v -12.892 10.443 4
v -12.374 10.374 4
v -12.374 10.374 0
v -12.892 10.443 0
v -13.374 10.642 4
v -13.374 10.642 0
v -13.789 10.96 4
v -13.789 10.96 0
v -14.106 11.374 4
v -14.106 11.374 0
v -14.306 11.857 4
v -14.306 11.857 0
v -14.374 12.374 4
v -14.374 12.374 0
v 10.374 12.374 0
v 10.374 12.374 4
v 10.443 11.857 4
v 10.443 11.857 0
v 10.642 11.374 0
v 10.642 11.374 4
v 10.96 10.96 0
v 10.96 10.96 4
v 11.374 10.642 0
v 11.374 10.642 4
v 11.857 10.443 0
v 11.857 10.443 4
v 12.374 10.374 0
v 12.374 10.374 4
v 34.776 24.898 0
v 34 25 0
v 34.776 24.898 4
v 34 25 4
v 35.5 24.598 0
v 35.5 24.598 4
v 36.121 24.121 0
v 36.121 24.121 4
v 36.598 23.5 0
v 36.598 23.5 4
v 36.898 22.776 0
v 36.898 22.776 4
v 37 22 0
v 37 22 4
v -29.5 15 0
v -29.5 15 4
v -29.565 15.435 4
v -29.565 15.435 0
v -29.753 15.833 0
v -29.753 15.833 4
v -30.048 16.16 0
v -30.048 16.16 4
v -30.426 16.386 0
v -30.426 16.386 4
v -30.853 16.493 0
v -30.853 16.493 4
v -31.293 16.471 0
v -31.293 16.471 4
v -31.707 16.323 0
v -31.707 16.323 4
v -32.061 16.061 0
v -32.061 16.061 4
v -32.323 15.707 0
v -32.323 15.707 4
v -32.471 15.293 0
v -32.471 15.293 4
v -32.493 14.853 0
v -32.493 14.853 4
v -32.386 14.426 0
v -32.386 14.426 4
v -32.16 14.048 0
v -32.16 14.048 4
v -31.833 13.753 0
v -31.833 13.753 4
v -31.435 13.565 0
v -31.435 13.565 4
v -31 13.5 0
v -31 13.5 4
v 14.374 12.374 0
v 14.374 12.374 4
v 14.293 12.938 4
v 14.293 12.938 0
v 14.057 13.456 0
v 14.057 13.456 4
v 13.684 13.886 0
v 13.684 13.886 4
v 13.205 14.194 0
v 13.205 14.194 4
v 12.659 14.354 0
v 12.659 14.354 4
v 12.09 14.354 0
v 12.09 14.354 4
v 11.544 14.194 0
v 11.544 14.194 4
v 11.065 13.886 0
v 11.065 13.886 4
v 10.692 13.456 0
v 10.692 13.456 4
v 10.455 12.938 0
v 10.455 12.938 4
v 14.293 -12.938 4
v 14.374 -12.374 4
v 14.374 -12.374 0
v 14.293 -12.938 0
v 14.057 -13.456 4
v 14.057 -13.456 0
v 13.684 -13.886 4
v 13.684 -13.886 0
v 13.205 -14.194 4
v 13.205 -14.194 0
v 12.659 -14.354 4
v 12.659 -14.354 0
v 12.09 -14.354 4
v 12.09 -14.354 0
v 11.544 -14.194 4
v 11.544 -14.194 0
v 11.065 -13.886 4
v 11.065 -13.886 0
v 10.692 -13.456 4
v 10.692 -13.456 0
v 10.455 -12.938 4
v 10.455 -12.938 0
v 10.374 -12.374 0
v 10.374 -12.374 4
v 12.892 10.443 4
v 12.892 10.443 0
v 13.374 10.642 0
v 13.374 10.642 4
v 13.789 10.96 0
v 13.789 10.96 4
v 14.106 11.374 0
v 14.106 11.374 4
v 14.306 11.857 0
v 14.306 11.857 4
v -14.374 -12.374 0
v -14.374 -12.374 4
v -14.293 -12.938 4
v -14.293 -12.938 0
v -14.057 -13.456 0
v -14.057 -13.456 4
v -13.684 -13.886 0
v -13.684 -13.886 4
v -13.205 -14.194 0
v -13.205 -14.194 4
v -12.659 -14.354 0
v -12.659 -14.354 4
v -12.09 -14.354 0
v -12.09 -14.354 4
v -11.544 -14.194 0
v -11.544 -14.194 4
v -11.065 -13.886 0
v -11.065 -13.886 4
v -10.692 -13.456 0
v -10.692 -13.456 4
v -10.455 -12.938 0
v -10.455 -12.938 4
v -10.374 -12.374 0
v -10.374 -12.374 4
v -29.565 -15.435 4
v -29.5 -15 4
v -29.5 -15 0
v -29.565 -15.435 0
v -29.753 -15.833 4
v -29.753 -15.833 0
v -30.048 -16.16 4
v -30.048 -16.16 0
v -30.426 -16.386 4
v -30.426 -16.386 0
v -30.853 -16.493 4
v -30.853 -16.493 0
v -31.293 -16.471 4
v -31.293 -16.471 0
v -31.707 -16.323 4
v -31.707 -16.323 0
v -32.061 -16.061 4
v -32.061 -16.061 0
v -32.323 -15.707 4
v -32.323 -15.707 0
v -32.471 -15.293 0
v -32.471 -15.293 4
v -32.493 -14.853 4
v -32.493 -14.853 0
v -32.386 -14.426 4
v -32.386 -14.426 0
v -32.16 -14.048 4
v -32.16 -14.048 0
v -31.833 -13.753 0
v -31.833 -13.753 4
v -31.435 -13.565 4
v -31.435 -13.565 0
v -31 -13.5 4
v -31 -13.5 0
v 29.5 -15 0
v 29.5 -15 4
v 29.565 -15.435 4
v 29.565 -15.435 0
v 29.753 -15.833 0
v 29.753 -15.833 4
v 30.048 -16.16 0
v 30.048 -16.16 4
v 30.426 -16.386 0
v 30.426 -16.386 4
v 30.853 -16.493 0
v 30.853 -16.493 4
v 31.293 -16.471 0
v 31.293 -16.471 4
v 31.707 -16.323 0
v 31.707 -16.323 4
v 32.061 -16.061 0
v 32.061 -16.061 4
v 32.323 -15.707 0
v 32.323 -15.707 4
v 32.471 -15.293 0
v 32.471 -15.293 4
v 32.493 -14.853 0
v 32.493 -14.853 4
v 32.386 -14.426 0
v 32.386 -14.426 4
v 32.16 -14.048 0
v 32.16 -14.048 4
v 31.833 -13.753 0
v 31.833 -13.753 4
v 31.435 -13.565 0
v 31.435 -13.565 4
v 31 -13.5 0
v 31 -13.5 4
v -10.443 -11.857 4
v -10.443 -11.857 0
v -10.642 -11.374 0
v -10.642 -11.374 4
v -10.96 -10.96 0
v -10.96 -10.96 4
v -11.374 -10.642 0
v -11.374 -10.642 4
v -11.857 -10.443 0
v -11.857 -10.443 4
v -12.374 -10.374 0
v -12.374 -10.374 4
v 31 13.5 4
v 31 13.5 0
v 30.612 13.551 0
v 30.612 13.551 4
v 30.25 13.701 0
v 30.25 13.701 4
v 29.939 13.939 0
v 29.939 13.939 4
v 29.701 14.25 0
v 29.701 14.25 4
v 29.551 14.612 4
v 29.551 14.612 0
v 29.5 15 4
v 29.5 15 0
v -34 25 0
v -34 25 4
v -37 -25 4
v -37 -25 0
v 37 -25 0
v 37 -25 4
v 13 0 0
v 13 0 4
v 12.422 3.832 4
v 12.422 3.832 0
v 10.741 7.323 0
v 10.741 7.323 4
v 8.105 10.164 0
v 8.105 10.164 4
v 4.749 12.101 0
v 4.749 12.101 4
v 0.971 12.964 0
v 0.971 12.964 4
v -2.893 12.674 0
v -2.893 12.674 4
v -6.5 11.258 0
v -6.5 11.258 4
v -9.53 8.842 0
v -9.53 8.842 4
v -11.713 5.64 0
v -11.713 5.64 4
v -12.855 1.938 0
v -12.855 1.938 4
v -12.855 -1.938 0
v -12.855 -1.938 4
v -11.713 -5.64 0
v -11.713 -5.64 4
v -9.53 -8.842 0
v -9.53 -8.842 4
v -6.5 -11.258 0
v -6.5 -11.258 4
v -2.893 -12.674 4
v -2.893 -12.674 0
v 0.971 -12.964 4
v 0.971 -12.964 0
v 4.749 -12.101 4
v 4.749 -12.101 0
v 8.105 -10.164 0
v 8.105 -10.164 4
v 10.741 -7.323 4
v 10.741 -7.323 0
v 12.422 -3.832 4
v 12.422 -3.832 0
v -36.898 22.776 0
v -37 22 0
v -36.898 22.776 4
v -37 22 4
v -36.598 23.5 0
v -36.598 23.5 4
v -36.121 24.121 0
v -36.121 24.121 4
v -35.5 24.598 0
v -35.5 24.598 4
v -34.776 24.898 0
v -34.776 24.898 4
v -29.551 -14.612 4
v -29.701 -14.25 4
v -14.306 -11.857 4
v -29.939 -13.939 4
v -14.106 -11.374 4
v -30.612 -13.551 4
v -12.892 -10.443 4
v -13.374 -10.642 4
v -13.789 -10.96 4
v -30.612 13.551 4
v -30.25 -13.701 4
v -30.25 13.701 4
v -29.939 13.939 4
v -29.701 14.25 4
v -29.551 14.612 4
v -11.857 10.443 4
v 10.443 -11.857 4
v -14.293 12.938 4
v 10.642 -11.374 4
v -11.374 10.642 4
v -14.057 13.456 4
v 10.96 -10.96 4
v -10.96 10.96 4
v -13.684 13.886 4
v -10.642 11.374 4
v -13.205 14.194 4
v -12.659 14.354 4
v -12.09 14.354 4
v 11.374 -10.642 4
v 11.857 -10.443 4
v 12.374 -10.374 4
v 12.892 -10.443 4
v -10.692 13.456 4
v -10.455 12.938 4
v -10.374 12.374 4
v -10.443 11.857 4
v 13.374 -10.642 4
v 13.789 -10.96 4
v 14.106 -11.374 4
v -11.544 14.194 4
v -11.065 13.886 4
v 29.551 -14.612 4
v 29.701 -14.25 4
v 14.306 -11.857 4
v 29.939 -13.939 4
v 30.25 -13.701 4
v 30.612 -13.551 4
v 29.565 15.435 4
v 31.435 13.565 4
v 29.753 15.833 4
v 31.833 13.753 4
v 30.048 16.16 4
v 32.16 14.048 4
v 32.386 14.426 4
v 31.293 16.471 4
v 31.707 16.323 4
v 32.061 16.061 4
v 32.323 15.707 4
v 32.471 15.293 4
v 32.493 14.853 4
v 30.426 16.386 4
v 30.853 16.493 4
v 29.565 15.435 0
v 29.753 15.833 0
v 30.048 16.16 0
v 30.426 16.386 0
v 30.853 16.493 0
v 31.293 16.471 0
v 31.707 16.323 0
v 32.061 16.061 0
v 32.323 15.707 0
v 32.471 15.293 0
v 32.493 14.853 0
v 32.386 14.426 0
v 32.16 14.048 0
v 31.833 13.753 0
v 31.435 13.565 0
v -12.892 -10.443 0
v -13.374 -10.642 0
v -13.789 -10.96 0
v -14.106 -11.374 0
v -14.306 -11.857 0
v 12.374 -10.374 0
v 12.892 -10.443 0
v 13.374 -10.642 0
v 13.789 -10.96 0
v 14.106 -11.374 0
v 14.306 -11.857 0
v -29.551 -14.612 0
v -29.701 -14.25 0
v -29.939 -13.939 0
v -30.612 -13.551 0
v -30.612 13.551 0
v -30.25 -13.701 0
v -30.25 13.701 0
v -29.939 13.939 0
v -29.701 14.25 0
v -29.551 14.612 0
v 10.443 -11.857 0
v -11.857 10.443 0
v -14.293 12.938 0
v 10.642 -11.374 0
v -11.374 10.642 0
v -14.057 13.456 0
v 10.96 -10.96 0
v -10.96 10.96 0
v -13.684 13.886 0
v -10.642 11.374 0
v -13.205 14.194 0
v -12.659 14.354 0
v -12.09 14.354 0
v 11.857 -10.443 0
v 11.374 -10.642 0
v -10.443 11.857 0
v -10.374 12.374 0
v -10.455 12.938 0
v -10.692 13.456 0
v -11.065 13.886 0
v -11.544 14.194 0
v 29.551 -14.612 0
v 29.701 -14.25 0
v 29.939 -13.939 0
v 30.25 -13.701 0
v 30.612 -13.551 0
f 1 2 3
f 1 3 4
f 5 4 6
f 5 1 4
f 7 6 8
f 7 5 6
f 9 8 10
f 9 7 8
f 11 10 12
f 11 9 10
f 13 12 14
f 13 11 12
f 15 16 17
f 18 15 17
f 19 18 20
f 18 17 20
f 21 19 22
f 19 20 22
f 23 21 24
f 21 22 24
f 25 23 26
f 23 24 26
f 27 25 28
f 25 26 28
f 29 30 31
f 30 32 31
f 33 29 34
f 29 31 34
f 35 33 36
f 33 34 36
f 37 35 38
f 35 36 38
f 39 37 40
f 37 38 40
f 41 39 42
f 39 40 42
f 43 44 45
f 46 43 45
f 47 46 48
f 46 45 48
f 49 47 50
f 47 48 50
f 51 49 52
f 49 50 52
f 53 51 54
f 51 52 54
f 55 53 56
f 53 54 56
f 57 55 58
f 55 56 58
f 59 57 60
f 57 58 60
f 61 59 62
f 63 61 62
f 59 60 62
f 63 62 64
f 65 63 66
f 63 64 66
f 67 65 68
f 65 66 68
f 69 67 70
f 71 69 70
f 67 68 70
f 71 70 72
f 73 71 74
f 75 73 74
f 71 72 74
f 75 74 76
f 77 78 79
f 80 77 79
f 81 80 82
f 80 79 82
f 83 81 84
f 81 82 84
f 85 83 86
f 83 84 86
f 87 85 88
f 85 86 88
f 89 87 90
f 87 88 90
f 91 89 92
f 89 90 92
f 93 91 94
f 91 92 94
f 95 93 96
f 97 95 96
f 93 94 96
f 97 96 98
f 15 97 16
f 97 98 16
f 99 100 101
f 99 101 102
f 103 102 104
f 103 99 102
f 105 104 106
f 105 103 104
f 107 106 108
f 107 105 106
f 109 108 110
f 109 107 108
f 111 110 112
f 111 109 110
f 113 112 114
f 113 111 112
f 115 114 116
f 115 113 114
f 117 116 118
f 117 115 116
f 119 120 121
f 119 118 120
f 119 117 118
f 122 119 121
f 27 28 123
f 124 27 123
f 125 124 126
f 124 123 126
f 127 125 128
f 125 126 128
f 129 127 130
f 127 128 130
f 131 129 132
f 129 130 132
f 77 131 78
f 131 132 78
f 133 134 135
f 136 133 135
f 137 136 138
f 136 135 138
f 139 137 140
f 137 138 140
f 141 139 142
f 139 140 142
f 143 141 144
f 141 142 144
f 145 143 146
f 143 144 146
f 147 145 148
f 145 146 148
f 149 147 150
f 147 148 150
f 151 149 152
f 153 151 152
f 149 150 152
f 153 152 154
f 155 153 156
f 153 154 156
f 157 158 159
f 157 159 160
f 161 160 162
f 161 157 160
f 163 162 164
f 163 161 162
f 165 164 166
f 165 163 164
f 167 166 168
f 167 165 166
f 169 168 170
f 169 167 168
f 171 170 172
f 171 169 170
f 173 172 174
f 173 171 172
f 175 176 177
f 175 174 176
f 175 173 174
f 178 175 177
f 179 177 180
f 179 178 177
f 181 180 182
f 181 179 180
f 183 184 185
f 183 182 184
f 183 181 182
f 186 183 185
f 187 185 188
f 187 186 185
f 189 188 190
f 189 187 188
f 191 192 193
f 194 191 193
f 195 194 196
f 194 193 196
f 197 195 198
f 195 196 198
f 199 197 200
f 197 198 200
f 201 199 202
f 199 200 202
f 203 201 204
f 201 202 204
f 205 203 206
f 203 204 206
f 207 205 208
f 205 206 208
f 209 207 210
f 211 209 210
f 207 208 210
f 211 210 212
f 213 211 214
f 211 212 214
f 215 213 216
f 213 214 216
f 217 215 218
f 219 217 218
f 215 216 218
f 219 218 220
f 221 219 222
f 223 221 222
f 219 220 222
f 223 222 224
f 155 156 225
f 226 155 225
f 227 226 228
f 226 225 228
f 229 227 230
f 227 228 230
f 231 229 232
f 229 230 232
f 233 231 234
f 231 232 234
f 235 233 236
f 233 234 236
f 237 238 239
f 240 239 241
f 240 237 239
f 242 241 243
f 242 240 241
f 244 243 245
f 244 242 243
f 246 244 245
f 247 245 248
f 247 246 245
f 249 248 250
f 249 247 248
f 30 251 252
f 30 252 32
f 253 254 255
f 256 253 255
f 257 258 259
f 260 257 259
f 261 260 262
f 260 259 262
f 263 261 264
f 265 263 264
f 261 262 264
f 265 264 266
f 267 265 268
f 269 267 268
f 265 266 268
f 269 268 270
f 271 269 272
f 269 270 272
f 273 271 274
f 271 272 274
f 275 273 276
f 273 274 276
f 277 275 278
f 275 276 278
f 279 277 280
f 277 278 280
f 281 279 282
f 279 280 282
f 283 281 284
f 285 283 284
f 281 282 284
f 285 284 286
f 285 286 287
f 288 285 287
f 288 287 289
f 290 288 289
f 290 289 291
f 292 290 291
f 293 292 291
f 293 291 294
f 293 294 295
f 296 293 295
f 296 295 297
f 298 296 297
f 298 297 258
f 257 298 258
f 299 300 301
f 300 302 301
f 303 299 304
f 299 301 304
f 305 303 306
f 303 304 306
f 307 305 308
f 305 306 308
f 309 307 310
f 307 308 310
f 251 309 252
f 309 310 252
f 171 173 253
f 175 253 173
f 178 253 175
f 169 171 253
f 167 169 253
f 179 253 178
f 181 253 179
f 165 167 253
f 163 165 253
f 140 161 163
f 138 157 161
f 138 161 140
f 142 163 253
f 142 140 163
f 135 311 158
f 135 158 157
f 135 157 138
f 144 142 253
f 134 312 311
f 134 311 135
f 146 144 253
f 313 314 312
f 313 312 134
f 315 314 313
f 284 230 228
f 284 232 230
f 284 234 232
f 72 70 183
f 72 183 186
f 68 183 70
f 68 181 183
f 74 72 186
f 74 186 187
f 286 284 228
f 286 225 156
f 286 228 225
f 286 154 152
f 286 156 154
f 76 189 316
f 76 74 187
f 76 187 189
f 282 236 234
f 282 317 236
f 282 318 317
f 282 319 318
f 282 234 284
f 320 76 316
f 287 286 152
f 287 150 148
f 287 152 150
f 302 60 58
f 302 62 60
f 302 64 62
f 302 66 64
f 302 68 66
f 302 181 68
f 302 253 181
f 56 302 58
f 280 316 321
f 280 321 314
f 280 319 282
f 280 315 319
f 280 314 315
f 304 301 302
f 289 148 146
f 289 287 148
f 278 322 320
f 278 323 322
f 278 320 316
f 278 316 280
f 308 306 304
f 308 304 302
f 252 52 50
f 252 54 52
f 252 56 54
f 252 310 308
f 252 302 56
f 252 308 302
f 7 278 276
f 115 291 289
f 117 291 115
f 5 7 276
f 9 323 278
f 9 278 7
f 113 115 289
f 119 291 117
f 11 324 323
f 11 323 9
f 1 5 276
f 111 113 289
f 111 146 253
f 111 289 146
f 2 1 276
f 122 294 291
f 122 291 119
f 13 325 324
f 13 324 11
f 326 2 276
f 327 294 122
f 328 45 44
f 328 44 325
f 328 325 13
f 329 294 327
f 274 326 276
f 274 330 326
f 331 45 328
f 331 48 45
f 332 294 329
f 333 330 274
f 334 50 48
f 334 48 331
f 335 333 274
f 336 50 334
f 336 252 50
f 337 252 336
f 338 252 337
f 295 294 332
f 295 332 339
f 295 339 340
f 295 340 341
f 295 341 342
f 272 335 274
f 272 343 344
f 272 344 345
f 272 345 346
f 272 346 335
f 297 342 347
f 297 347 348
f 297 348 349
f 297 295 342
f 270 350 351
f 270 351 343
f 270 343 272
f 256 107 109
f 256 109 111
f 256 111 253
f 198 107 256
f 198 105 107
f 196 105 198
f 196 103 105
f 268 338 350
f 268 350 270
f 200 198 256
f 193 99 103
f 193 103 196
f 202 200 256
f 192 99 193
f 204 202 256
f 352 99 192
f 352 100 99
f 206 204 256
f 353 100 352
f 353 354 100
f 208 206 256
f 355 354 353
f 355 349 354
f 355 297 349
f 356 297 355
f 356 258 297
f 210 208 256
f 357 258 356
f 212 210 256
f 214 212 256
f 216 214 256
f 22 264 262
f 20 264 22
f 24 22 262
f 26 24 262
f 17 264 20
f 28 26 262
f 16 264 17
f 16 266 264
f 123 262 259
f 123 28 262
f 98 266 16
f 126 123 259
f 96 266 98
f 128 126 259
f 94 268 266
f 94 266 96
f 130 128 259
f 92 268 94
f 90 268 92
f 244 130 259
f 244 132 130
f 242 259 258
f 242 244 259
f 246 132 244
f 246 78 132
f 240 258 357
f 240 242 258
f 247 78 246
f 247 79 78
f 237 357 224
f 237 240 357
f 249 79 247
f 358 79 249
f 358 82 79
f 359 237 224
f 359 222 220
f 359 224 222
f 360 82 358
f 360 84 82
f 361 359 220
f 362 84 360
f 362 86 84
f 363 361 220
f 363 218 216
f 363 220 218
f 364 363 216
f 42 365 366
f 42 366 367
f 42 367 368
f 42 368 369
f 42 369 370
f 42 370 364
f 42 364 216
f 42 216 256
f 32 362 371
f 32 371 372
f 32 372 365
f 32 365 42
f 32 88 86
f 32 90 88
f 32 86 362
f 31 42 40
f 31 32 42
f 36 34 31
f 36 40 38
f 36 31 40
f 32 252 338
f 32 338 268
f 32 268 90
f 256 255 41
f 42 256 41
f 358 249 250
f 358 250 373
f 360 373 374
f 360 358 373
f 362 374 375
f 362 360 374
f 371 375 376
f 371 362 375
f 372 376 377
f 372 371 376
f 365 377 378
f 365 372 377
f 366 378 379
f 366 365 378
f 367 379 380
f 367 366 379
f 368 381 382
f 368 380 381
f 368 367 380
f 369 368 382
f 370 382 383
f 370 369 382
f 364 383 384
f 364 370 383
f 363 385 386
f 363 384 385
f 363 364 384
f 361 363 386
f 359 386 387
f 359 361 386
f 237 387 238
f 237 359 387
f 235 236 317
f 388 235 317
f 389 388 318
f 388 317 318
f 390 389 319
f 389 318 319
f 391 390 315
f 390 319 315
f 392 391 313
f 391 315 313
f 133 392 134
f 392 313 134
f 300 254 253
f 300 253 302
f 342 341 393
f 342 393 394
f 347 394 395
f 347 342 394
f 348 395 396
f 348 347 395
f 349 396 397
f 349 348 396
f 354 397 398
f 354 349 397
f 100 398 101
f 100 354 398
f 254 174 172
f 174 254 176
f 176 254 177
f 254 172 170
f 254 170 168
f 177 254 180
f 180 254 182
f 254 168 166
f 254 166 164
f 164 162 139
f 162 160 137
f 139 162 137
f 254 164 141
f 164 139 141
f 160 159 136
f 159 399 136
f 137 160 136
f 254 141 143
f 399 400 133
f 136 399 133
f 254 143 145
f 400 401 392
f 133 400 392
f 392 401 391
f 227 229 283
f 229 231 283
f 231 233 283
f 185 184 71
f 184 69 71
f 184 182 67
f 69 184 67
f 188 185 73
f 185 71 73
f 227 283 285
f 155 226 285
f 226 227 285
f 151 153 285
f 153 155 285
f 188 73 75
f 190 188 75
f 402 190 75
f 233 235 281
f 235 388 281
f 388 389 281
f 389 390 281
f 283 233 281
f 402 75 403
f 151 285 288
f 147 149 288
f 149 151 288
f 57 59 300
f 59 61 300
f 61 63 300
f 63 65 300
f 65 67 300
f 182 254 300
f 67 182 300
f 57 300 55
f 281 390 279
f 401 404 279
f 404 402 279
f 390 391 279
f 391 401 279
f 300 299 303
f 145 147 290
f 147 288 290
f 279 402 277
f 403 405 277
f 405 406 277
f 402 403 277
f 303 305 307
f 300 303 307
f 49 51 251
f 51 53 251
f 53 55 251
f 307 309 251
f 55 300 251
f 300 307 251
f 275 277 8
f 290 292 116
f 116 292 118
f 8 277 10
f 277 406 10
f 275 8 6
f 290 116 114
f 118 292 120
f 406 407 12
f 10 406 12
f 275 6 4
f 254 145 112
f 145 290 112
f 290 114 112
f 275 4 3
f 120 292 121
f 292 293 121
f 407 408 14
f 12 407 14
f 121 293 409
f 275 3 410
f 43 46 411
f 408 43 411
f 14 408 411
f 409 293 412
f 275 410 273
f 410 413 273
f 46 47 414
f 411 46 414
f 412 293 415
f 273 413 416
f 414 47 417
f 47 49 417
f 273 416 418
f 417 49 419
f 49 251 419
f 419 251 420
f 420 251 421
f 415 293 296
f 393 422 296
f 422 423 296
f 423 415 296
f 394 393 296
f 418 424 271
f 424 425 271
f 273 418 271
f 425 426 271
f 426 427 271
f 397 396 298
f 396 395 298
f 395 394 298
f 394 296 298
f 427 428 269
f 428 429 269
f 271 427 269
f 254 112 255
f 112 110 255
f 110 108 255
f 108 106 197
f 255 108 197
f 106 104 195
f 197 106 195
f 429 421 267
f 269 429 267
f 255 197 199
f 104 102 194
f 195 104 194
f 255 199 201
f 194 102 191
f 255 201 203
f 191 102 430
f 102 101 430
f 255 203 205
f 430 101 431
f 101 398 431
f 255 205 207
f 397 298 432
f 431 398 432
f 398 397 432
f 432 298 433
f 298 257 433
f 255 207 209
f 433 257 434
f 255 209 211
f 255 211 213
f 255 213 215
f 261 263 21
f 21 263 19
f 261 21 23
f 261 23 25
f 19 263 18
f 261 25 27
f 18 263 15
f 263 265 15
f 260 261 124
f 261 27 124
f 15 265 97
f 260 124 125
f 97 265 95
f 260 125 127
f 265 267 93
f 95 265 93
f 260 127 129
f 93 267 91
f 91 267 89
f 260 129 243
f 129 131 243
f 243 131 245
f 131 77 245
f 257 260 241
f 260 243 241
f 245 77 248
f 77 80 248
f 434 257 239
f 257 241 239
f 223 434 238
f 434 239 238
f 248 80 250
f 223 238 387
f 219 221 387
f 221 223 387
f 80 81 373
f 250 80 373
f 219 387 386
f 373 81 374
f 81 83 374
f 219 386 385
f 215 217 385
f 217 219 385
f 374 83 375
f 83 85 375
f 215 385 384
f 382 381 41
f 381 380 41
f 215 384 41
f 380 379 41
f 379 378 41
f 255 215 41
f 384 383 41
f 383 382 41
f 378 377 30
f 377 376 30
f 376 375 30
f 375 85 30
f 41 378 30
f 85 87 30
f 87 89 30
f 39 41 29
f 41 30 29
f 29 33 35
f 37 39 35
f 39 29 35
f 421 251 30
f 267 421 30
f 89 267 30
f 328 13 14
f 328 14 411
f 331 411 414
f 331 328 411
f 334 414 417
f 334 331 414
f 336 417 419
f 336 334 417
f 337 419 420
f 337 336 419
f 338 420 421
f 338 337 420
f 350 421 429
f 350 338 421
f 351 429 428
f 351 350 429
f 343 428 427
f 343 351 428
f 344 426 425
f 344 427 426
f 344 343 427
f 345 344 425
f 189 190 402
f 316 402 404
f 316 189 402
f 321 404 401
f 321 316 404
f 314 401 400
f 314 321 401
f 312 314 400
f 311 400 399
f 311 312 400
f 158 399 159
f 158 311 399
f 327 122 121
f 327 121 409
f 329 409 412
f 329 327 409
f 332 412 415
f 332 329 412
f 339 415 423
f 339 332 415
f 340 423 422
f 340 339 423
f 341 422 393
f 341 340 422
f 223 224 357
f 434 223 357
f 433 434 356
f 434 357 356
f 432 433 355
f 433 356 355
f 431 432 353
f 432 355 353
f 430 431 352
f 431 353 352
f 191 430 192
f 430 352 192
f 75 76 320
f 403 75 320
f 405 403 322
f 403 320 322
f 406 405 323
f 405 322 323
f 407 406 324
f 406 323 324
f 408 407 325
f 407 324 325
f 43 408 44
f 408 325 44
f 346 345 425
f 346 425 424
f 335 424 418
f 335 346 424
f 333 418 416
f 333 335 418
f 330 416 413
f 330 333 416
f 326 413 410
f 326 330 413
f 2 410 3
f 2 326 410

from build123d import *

# Parameters (mm, degrees)
SKETCH_1_W            = 74
SKETCH_1_H            = 50
EXTRUDE_1_DEPTH       = 4
SKETCH_2_R            = 13
CUT_EXTRUDE_1_DEPTH   = 45.833023543
CUT_EXTRUDE_2_DEPTH   = 45.833023543
MIRROR_2_COPY_1_DEPTH = 45.833023543
CUT_EXTRUDE_3_DEPTH   = 45.833023543
MIRROR_4_COPY_1_DEPTH = 45.833023543
FILLET_2_R            = 3


with BuildPart() as part:
    # 草图1 → 凸台-拉伸1 (new body)
    with BuildSketch(Plane.XY):
        Rectangle(SKETCH_1_W, SKETCH_1_H)
    extrude(amount=EXTRUDE_1_DEPTH)

    # 草图2 → 切除-拉伸1 (cut, through all)
    with BuildSketch(Plane.XY.offset(4)):
        Circle(SKETCH_2_R)
    extrude(amount=-CUT_EXTRUDE_1_DEPTH, mode=Mode.SUBTRACT)

    # 草图3 → 切除-拉伸2 (cut, through all)
    with BuildSketch(Plane.XY.offset(4)):
        with BuildLine():
            ThreePointArc((10.374368671, 12.374368671), (10.960155108, 10.960155108), (12.374368671, 10.374368671))
            Line((12.374368671, 10.374368671), (12.374368671, 12.374368671))
            Line((12.374368671, 12.374368671), (10.374368671, 12.374368671))
        make_face()
        with BuildLine():
            Line((12.374368671, 12.374368671), (12.374368671, 10.374368671))
            ThreePointArc((12.374368671, 10.374368671), (13.788582233, 10.960155108), (14.374368671, 12.374368671))
            ThreePointArc((14.374368671, 12.374368671), (12.374368671, 14.374368671), (10.374368671, 12.374368671))
            Line((10.374368671, 12.374368671), (12.374368671, 12.374368671))
        make_face()
    cut_extrude_2 = extrude(amount=-CUT_EXTRUDE_2_DEPTH, mode=Mode.SUBTRACT)

    # 镜向1: 切除-拉伸2 across plane
    add(cut_extrude_2.mirror(Plane(origin=(0, 0, 0), x_dir=(0, 0, 1), z_dir=(1, 0, 0))), mode=Mode.SUBTRACT)

    # 镜向2: 切除-拉伸2 across plane
    add(cut_extrude_2.mirror(Plane.ZX), mode=Mode.SUBTRACT)

    # 镜向2 copy 1 sketch → 镜向2 copy 1 (cut, through all)
    with BuildSketch(Plane(origin=(0, 0, 4), x_dir=(-1, 0, 0), z_dir=(0, 0, 1))):
        with BuildLine():
            ThreePointArc((10.374368671, 12.374368671), (10.960155108, 10.960155108), (12.374368671, 10.374368671))
            Line((12.374368671, 10.374368671), (12.374368671, 12.374368671))
            Line((12.374368671, 12.374368671), (10.374368671, 12.374368671))
        make_face()
        with BuildLine():
            Line((12.374368671, 12.374368671), (12.374368671, 10.374368671))
            ThreePointArc((12.374368671, 10.374368671), (13.788582233, 10.960155108), (14.374368671, 12.374368671))
            ThreePointArc((14.374368671, 12.374368671), (12.374368671, 14.374368671), (10.374368671, 12.374368671))
            Line((10.374368671, 12.374368671), (12.374368671, 12.374368671))
        make_face()
    extrude(amount=-MIRROR_2_COPY_1_DEPTH, mode=Mode.SUBTRACT)

    # 草图4 → 切除-拉伸3 (cut, through all)
    with BuildSketch(Plane.XY.offset(4)):
        with BuildLine():
            ThreePointArc((-29.5, 15), (-32.060660172, 16.060660172), (-31, 13.5))
            Line((-31, 13.5), (-31, 15))
            Line((-31, 15), (-29.5, 15))
        make_face()
        with BuildLine():
            Line((-31, 15), (-31, 13.5))
            ThreePointArc((-31, 13.5), (-29.939339828, 13.939339828), (-29.5, 15))
            Line((-29.5, 15), (-31, 15))
        make_face()
    cut_extrude_3 = extrude(amount=-CUT_EXTRUDE_3_DEPTH, mode=Mode.SUBTRACT)

    # 镜向3: 切除-拉伸3 across plane
    add(cut_extrude_3.mirror(Plane(origin=(0, 0, 0), x_dir=(0, 0, 1), z_dir=(1, 0, 0))), mode=Mode.SUBTRACT)

    # 镜向4: 切除-拉伸3 across plane
    add(cut_extrude_3.mirror(Plane.ZX), mode=Mode.SUBTRACT)

    # 镜向4 copy 1 sketch → 镜向4 copy 1 (cut, through all)
    with BuildSketch(Plane(origin=(0, 0, 4), x_dir=(-1, 0, 0), z_dir=(0, 0, 1))):
        with BuildLine():
            ThreePointArc((-29.5, 15), (-32.060660172, 16.060660172), (-31, 13.5))
            Line((-31, 13.5), (-31, 15))
            Line((-31, 15), (-29.5, 15))
        make_face()
        with BuildLine():
            Line((-31, 15), (-31, 13.5))
            ThreePointArc((-31, 13.5), (-29.939339828, 13.939339828), (-29.5, 15))
            Line((-29.5, 15), (-31, 15))
        make_face()
    extrude(amount=-MIRROR_4_COPY_1_DEPTH, mode=Mode.SUBTRACT)

    # 圆角2
    fillet_2_edges = [part.edges().sort_by_distance(p)[0] for p in [
        (-37, 25, 2),
        (37, 25, 2),
    ]]
    fillet(fillet_2_edges, radius=FILLET_2_R)


solid = part.part
